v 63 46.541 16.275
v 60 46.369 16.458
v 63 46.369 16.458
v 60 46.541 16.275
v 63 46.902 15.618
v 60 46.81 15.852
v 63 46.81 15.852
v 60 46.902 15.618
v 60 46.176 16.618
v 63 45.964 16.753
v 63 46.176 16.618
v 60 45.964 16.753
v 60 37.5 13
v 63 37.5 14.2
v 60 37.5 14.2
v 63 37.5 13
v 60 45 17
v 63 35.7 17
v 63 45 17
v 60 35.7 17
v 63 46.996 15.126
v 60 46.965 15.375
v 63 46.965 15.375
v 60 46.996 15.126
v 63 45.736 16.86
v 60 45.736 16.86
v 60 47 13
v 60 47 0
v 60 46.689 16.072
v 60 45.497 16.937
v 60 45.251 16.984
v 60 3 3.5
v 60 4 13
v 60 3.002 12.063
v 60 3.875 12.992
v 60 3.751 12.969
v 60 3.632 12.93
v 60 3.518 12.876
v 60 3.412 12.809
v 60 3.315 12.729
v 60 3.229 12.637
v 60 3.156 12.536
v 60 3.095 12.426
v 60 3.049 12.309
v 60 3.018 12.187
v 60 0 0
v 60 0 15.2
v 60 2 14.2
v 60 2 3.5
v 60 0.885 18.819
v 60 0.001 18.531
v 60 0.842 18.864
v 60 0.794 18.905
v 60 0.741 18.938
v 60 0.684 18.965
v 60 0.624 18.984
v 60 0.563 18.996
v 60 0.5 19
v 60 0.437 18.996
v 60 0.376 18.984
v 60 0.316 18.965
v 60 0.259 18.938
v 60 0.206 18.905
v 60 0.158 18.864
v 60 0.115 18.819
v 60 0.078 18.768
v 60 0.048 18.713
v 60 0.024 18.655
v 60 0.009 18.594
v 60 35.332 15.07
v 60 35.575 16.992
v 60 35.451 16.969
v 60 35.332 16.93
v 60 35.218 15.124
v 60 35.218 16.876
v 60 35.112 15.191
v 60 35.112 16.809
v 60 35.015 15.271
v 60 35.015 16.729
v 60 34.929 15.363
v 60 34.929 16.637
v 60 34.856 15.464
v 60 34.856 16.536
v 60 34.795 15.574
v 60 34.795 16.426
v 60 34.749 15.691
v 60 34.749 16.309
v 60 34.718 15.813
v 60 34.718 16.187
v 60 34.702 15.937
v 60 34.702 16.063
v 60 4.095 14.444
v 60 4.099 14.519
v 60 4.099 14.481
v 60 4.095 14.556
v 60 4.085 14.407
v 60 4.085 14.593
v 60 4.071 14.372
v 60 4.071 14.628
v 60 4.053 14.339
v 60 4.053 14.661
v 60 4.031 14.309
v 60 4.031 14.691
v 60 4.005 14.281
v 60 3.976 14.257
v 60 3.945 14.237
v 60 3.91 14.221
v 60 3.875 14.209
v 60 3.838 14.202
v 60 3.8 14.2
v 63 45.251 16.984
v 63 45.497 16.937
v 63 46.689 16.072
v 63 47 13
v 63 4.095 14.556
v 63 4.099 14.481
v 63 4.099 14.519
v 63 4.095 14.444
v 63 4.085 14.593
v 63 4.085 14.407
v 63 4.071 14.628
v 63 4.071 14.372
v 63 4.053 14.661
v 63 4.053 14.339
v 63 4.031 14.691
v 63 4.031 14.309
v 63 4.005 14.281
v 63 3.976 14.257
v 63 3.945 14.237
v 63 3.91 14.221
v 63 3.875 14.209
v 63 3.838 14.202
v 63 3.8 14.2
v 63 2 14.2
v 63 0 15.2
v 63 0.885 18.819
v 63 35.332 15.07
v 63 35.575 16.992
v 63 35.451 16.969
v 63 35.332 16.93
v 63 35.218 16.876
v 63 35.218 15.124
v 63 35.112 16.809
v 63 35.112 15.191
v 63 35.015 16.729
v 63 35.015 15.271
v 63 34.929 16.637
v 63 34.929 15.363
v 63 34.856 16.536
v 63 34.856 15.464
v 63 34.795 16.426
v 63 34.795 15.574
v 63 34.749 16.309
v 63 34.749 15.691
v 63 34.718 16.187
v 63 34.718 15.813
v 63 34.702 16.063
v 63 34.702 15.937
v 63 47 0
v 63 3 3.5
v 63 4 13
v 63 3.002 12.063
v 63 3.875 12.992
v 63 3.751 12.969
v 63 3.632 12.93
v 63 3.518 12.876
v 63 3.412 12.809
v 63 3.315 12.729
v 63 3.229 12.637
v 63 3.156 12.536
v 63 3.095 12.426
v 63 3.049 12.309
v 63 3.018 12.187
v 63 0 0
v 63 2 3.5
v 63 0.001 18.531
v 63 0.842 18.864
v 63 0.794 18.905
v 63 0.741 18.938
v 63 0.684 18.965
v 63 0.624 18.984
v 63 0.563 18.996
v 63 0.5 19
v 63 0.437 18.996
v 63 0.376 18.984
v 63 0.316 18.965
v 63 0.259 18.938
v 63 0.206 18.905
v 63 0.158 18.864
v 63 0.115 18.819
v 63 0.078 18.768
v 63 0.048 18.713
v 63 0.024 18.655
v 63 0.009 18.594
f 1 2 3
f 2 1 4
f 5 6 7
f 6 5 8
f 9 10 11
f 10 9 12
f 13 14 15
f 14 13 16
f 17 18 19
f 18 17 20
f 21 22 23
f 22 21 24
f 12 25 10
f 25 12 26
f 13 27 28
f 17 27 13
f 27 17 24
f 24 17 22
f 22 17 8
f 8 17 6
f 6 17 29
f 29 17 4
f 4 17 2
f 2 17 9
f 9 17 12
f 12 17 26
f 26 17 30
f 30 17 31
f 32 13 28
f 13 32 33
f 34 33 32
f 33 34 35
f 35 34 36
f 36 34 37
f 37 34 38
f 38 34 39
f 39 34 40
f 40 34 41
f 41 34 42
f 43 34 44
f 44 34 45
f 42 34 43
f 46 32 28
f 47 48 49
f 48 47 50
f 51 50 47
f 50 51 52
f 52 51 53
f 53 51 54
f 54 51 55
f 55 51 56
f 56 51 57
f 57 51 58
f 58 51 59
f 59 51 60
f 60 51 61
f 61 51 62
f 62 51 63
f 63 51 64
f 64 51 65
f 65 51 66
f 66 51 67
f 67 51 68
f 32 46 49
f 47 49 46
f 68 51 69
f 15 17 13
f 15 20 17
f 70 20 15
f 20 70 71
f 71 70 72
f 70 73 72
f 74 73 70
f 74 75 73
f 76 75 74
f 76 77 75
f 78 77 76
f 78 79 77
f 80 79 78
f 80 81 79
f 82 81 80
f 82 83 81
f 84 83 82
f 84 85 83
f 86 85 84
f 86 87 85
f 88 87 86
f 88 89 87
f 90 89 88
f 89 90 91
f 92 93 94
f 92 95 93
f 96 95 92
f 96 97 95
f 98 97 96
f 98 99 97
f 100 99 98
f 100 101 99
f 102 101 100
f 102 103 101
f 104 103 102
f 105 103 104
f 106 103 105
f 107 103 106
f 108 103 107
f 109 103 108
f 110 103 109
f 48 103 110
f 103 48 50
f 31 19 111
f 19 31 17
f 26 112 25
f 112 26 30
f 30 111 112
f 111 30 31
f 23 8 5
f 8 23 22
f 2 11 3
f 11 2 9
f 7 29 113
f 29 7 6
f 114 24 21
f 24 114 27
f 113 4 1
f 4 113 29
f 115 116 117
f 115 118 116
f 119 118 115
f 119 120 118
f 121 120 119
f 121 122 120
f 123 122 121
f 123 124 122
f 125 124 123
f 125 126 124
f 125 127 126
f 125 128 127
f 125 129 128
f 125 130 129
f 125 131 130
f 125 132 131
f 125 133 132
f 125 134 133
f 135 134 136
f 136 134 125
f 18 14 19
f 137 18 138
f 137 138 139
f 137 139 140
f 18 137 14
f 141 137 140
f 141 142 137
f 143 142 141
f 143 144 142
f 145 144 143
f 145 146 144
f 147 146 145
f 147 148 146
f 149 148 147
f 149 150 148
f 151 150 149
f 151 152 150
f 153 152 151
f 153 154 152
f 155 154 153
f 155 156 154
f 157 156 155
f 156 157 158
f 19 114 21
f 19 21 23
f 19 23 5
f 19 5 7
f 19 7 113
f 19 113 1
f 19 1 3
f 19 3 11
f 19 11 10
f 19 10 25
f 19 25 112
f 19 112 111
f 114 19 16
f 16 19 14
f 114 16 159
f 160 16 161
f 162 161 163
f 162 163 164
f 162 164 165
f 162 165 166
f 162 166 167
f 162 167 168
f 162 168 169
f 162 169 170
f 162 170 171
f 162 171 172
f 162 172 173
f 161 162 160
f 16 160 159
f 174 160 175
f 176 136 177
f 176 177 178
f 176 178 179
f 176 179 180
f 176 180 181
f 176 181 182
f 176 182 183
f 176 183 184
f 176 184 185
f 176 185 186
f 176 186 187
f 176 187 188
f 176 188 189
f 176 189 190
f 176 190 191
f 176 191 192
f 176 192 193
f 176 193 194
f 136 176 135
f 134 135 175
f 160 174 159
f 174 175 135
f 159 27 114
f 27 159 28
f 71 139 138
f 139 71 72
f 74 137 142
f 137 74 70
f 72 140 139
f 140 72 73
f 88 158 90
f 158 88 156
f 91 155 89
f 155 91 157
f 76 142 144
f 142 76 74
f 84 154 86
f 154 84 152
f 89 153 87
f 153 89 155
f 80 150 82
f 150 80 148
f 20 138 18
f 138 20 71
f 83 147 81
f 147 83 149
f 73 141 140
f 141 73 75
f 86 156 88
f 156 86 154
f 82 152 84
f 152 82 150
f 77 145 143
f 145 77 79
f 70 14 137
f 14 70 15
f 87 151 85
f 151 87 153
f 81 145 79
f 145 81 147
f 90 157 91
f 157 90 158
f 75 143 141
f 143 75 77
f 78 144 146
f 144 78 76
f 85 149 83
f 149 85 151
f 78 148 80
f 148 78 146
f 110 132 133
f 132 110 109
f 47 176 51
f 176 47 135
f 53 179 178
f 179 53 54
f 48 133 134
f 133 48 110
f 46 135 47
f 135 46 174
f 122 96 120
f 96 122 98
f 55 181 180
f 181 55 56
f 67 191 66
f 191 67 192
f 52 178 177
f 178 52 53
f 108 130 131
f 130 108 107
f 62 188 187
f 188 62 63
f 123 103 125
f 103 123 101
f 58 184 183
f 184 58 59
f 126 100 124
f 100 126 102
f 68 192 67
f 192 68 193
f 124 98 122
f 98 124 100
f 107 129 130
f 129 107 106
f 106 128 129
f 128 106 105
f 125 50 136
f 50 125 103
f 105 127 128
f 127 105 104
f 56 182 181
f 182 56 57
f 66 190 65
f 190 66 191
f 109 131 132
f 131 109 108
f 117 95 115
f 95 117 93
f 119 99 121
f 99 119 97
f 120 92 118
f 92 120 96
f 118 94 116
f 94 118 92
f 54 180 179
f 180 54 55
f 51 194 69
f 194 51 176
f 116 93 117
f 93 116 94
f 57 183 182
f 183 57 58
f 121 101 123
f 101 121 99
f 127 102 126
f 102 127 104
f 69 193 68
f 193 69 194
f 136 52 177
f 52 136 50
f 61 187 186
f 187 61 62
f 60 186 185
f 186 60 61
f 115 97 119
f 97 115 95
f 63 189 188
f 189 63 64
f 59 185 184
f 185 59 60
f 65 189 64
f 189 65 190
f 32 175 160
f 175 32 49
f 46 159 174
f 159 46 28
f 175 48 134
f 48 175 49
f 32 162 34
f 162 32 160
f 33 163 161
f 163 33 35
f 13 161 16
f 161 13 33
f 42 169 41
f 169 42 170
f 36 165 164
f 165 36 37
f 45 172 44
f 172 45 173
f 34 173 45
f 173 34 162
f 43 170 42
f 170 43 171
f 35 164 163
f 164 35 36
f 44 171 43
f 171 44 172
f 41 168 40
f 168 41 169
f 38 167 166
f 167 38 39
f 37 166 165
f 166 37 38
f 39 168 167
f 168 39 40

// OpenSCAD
//-------------------------------------------------------------------
// title: DIN Rail Clip Library
// description: Reusable module for creating DIN rail mounting clips
// designed as separate glue-on components
// based on: OK1HRA's design (http://remoteqth.com/3d-din-rail-mount-clip.php)
// license: Creative Commons BY-SA
// revision: 2.0
// format: OpenSCAD
//-------------------------------------------------------------------
// Standard DIN rail: 35mm wide, 7.5mm deep mounting channel
// Clips are designed to be printed separately and glued onto your project
//-------------------------------------------------------------------

/**
 * din_rail_clip_side_mount - DIN rail clip for side mounting (minimizes depth)
 *
 * This creates a thin clip profile that lies flat for side mounting.
 * Just the clip profile rotated 90 degrees - no perpendicular gluing surface.
 * Print separately and glue the flat back to your enclosure side.
 * Best for minimizing the depth added to your project.
 *
 * Parameters:
 *   clip_height - Height along the DIN rail (default: 55mm)
 *   clip_thickness - Thickness of the clip itself (default: 3mm, thin for side mount)
 *
 * Usage:
 *   din_rail_clip_side_mount();
 *   din_rail_clip_side_mount(clip_height=40, clip_thickness=2.5);
 */
module din_rail_clip_side_mount(
    clip_height=55,
    clip_thickness=3
) {
    // The DIN rail clip profile (rotated for side mounting)
    // The flat back surface is ready for gluing
    rotate([0, -90, 0])
    translate([0, 0, -clip_thickness])
        din_rail_clip_profile(height=clip_thickness, length=clip_height);
}


/**
 * din_rail_clip_profile - Internal module for the basic clip geometry
 *
 * Creates just the DIN rail hook profile without any mounting features.
 * This is the core geometry used by other modules.
 *
 * Parameters:
 *   height - Height/thickness of the clip (direction perpendicular to rail)
 *   length - Length along the rail (default: 55mm)
 *
 * Note: This is typically used internally by other modules, but can be used
 * directly if you need the raw profile for custom applications.
 */
module din_rail_clip_profile(height=7, length=55) {
    width_expand = 0; // Keep profile compact for glue-on design

    // Main clip body and hook mechanism
    union() {
        // Top hook - grips the top lip of DIN rail
        hull() {
            translate([15+width_expand, length-2, 0])
                cylinder(h=height, r=2, center=false);
            translate([12+width_expand, 37.5, 0])
                cube([5, 1, height], center=false);
            translate([12+width_expand, length-1, 0])
                cube([1, 1, height], center=false);
        }

        // Secondary hook element - provides grip strength
        hull() {
            translate([16+width_expand, 35.7, 0])
                cylinder(h=height, r=1, center=false);
            translate([14.2+width_expand, 37.5, 0])
                cube([2.8, 1, height], center=false);
        }

        // Lower clip curve - hooks under DIN rail lip
        hull() {
            translate([18.5+width_expand, 0.5, 0])
                cylinder(h=height, r=0.5, center=false);
            translate([14.5+width_expand, 3.8, 0])
                cylinder(h=height, r=0.3, center=false);
            translate([14.2+width_expand, 0, 0])
                cube([1, 1, height], center=false);
        }

        // Base mounting surface elements
        cube([3.5, 4, height], center=false);
        cube([15+width_expand, 2, height], center=false);

        // Main vertical back plate
        hull() {
            translate([12+width_expand, 4, 0])
                cylinder(h=height, r=1, center=false);
            translate([0, 3, 0])
                cube([1, 1, height], center=false);
            translate([0, length-1, 0])
                cube([13+width_expand, 1, height], center=false);
        }
    }
}

/**
 * din_rail_clip_with_mount - DIN clip with integrated mounting holes
 *
 * Creates a DIN rail clip with a mounting plate and screw holes.
 *
 * Parameters:
 *   height - Thickness of the clip
 *   screw_distance - Distance between mounting screws (default: 40mm)
 *   screw_radius - Radius of mounting screw holes (default: 1.7mm for M3)
 *   indentation - Depth of side tabs (default: 3mm)
 *   length - Length along the rail
 *   width_expand - Extra width extension
 *
 * Usage:
 *   din_rail_clip_with_mount();
 *   din_rail_clip_with_mount(screw_distance=50, screw_radius=2);
 */
module din_rail_clip_with_mount(
    height=7,
    screw_distance=40,
    screw_radius=1.7,
    indentation=3,
    length=55,
    width_expand=1
) {
    difference() {
        union() {
            // The DIN rail clip profile
            din_rail_clip(
                height=height,
                length=length,
                width_expand=width_expand
            );

            // Mounting plate extension
            hull() {
                translate([0, 40, 0])
                    cube([14, 1, height], center=false);
                translate([2, screw_distance+14, 0])
                    cylinder(h=height, r=2, center=false);
                translate([6, screw_distance+14, 0])
                    cylinder(h=height, r=2, center=false);
            }

            // Side indentation tabs (for grip or clearance)
            translate([-indentation, 10.5-3.5, 0])
                cube([indentation+1, 7, height], center=false);
            translate([-indentation, 10.5-3.5+screw_distance, 0])
                cube([indentation+1, 7, height], center=false);
        }

        // Small pilot hole at base
        translate([3.5, 2.5, -1])
            cylinder(h=height+2, r=0.5, center=false);

        // Retention/ventilation hole
        translate([9+width_expand, -1, height/2])
            rotate([-90, 0, 0])
                cylinder(h=16, r=screw_radius, center=false);
        translate([6.15+width_expand, 5, -1])
            cube([5.7, 3.9, height+2], center=false);

        // First mounting screw hole (horizontal)
        translate([-1-indentation, 10.5, height/2])
            rotate([0, 90, 0])
                cylinder(h=9+width_expand+indentation, r=screw_radius, center=false);
        translate([2, 7.65, -1])
            cube([3.9, 5.7, height+2], center=false);

        // Second mounting screw hole (horizontal)
        translate([-1-indentation, 10.5+screw_distance, height/2])
            rotate([0, 90, 0])
                cylinder(h=11+width_expand+indentation, r=screw_radius, center=false);
        translate([2, 7.65+screw_distance, -1])
            cube([3.9, 5.7, height+2], center=false);
    }
}

//-------------------------------------------------------------------
// EXAMPLES - Uncomment to test
//-------------------------------------------------------------------

// Example 1: Side-mount clip (minimizes depth - only 3mm thick!)
// Best for: Gluing to the side of enclosures
$fn = 50;
// din_rail_clip_side_mount();

// // Example 2: Thinner clip for very shallow enclosures
// translate([30, 0, 0])
//     din_rail_clip_side_mount(clip_thickness=2.5);

// Example 3: Clip sized to match 47mm zigbee box
translate([60, 0, 0])
    din_rail_clip_side_mount(clip_height=47);

// Example 4: Using with your main model
// cube([50, 60, 30]);
/*
// Your main enclosure with a flat side

// The clip positioned to glue on the side (print separately)
translate([50, 30, 15])
    rotate([0, 0, 90])
        din_rail_clip_side_mount();
*/

// Example 5: Legacy - Original clip with integrated mounting holes
// Use this if you want the original all-in-one design with screw holes
// translate([0, 140, 0])
//     din_rail_clip_with_mount();
